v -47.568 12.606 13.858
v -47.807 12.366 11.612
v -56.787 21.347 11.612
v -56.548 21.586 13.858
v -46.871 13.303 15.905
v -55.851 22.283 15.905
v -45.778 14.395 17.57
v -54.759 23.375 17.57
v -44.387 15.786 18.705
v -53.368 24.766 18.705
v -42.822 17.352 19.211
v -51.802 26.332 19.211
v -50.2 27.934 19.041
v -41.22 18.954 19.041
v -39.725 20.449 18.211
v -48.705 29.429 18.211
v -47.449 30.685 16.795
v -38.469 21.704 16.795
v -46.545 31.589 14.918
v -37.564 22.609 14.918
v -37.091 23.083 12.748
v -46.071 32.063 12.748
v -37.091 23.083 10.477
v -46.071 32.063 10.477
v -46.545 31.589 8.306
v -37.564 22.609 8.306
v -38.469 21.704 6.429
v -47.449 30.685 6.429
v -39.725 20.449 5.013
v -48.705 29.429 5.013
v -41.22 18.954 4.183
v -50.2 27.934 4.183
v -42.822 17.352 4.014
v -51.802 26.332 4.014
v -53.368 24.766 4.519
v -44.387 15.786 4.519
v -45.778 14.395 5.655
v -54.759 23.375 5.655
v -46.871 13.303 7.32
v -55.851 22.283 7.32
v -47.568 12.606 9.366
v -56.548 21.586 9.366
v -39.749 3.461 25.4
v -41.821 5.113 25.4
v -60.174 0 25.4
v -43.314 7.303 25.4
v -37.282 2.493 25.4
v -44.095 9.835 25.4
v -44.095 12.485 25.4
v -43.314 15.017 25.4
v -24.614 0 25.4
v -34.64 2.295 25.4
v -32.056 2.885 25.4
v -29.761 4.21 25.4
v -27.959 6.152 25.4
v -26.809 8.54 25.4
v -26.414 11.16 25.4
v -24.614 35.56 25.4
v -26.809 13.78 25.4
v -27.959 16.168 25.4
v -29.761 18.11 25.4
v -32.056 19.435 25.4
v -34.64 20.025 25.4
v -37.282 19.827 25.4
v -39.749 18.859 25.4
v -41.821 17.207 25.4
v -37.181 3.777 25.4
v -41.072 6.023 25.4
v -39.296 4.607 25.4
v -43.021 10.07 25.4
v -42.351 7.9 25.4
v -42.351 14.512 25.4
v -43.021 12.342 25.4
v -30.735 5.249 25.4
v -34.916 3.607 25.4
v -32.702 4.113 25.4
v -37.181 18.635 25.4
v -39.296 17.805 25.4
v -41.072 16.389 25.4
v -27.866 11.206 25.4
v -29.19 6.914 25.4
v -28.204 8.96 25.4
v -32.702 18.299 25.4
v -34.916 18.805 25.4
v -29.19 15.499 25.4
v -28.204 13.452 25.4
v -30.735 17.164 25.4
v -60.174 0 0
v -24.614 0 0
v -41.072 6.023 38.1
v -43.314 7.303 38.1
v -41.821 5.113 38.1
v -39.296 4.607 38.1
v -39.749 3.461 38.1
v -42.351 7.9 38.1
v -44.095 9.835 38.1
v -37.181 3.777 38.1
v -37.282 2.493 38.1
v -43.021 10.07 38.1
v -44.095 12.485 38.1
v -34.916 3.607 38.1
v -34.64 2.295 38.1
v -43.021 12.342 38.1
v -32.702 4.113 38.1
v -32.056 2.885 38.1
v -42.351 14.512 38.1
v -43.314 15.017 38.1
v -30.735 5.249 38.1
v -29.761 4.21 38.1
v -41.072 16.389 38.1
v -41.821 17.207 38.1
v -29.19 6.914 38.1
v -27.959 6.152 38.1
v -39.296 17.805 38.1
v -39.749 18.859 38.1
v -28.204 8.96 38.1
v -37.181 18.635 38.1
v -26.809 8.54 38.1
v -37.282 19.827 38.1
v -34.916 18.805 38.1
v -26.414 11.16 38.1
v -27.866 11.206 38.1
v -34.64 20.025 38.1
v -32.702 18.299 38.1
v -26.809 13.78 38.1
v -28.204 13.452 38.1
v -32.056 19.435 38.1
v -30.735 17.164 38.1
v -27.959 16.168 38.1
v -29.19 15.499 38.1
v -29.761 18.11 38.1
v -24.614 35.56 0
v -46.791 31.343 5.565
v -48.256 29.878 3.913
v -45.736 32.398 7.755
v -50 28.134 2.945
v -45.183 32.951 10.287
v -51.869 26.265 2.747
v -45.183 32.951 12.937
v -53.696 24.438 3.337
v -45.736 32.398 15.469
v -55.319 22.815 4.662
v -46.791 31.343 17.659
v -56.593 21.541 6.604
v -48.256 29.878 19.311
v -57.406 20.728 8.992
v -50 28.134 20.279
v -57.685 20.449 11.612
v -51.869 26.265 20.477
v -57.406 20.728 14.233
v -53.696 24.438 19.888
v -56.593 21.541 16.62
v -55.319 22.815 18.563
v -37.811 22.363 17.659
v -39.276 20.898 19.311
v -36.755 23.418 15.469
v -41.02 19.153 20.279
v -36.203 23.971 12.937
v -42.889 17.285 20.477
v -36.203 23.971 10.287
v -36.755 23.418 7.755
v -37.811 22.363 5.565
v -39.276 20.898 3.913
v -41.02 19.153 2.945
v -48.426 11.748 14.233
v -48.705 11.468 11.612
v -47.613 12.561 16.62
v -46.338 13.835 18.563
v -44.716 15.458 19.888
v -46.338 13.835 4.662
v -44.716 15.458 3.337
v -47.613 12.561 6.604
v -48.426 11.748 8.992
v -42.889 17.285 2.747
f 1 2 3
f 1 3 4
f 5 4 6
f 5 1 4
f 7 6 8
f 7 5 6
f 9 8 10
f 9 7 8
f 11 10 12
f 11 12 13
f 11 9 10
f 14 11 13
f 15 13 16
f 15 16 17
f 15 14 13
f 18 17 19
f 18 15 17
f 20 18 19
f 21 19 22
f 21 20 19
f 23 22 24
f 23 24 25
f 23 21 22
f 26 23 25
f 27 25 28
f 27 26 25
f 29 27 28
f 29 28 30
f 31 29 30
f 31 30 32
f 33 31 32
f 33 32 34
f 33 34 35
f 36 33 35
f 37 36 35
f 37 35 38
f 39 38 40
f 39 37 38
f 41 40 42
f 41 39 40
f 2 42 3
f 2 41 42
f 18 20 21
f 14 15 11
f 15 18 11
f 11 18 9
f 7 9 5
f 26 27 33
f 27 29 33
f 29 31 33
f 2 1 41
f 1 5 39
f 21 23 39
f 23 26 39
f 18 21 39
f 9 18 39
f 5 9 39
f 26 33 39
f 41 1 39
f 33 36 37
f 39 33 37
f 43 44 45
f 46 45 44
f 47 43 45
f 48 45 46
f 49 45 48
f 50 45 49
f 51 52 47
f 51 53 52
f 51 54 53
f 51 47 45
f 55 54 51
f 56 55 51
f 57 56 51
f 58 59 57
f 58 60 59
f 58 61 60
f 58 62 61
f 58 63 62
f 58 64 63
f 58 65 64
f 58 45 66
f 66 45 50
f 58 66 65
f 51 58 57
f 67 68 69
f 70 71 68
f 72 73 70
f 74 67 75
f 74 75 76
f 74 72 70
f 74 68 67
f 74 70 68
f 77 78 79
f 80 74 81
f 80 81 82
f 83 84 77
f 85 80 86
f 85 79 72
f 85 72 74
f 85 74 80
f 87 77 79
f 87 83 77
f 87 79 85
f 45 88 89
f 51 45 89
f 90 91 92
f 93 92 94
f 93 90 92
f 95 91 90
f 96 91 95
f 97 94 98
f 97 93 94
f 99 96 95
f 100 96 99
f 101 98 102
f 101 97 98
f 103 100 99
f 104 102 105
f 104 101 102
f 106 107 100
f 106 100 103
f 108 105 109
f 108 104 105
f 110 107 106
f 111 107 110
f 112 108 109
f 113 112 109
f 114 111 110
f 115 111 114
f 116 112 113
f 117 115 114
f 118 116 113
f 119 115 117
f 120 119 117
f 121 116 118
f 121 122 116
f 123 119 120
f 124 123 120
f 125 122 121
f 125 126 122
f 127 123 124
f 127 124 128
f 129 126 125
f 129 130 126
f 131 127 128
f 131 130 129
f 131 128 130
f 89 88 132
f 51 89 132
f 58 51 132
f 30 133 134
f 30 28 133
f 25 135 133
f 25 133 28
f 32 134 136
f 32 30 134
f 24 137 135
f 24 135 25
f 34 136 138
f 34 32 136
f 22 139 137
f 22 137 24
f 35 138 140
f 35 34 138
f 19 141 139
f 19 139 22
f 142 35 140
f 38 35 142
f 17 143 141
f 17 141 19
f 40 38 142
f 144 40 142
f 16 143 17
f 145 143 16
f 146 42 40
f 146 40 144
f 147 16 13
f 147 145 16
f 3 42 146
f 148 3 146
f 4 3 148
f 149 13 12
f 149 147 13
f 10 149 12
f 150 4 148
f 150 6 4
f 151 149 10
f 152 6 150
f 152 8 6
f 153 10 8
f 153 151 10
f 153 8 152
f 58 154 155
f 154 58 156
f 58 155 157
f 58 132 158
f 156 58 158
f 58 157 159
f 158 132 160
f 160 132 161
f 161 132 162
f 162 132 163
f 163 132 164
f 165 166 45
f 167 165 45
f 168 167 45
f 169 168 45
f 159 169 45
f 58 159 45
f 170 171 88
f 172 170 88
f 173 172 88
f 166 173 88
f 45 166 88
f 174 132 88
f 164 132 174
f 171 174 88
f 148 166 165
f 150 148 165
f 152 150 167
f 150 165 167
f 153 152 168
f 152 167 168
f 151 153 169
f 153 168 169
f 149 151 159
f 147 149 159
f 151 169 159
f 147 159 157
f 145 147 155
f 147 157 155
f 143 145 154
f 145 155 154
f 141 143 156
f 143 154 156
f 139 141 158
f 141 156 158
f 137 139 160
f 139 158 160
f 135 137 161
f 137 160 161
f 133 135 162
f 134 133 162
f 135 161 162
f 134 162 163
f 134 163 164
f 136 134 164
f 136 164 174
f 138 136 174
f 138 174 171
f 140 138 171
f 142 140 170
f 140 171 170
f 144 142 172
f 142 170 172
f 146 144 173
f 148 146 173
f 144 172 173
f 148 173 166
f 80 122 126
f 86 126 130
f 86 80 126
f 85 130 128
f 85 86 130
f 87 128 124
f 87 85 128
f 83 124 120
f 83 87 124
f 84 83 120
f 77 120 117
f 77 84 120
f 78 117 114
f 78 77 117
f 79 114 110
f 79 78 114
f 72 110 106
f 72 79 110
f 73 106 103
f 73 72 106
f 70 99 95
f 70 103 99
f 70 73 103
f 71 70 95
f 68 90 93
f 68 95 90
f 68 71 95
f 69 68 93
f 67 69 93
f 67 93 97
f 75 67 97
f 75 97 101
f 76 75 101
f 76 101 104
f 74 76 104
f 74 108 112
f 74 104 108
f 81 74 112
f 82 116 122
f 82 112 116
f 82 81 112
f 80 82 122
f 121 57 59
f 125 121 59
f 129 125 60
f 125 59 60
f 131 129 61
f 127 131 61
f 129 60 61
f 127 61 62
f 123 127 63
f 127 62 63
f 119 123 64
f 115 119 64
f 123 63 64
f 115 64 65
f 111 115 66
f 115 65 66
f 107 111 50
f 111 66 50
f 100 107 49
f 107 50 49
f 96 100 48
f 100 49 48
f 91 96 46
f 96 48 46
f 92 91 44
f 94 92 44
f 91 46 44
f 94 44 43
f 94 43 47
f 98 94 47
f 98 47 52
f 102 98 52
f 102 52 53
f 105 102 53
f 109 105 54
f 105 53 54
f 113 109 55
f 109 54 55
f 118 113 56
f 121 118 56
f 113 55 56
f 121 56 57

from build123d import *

# Parameters (mm, degrees)
F1_DEPTH = 25.4
F3_R     = 8.89
F4_DEPTH = 12.7
F2_R     = 7.62
F5_DEPTH = 39.116
F6_R     = 8.89
F6_R_2   = 7.62
F7_DEPTH = 12.7


with BuildPart() as f1:
    # F0 (on Top) → F1 (new body)
    with BuildSketch(Plane.XY):
        Polygon((-24.6135034411, 35.56), (-60.1735034411, 0), (-24.6135034411, 0), align=None)
    extrude(amount=F1_DEPTH)

    # F3 (on face) → F4 (join)
    with BuildSketch(Plane.XY.offset(25.4)):
        with Locations((-35.3040769696, 11.1599909142)):
            Circle(F3_R)
    extrude(amount=F4_DEPTH)

    # F2 (on face) → F5 (cut)
    with BuildSketch(Plane.XY.offset(25.4)):
        with Locations((-35.4857780039, 11.2061388791)):
            Circle(F2_R)
    extrude(amount=F5_DEPTH, mode=Mode.SUBTRACT)

    # F6 (on face) → F7 (join)
    with BuildSketch(Plane(origin=(-30.0867517206, 30.0867517206, 0), x_dir=(-0.7071067812, -0.7071067812, 0), z_dir=(-0.7071067812, 0.7071067812, 0))):
        with Locations((17.4403432757, 11.6122188047)):
            Circle(F6_R)
        with Locations((17.4403432757, 11.6122188047)):
            Circle(F6_R_2, mode=Mode.SUBTRACT)
    extrude(amount=F7_DEPTH)


solid = f1.part
